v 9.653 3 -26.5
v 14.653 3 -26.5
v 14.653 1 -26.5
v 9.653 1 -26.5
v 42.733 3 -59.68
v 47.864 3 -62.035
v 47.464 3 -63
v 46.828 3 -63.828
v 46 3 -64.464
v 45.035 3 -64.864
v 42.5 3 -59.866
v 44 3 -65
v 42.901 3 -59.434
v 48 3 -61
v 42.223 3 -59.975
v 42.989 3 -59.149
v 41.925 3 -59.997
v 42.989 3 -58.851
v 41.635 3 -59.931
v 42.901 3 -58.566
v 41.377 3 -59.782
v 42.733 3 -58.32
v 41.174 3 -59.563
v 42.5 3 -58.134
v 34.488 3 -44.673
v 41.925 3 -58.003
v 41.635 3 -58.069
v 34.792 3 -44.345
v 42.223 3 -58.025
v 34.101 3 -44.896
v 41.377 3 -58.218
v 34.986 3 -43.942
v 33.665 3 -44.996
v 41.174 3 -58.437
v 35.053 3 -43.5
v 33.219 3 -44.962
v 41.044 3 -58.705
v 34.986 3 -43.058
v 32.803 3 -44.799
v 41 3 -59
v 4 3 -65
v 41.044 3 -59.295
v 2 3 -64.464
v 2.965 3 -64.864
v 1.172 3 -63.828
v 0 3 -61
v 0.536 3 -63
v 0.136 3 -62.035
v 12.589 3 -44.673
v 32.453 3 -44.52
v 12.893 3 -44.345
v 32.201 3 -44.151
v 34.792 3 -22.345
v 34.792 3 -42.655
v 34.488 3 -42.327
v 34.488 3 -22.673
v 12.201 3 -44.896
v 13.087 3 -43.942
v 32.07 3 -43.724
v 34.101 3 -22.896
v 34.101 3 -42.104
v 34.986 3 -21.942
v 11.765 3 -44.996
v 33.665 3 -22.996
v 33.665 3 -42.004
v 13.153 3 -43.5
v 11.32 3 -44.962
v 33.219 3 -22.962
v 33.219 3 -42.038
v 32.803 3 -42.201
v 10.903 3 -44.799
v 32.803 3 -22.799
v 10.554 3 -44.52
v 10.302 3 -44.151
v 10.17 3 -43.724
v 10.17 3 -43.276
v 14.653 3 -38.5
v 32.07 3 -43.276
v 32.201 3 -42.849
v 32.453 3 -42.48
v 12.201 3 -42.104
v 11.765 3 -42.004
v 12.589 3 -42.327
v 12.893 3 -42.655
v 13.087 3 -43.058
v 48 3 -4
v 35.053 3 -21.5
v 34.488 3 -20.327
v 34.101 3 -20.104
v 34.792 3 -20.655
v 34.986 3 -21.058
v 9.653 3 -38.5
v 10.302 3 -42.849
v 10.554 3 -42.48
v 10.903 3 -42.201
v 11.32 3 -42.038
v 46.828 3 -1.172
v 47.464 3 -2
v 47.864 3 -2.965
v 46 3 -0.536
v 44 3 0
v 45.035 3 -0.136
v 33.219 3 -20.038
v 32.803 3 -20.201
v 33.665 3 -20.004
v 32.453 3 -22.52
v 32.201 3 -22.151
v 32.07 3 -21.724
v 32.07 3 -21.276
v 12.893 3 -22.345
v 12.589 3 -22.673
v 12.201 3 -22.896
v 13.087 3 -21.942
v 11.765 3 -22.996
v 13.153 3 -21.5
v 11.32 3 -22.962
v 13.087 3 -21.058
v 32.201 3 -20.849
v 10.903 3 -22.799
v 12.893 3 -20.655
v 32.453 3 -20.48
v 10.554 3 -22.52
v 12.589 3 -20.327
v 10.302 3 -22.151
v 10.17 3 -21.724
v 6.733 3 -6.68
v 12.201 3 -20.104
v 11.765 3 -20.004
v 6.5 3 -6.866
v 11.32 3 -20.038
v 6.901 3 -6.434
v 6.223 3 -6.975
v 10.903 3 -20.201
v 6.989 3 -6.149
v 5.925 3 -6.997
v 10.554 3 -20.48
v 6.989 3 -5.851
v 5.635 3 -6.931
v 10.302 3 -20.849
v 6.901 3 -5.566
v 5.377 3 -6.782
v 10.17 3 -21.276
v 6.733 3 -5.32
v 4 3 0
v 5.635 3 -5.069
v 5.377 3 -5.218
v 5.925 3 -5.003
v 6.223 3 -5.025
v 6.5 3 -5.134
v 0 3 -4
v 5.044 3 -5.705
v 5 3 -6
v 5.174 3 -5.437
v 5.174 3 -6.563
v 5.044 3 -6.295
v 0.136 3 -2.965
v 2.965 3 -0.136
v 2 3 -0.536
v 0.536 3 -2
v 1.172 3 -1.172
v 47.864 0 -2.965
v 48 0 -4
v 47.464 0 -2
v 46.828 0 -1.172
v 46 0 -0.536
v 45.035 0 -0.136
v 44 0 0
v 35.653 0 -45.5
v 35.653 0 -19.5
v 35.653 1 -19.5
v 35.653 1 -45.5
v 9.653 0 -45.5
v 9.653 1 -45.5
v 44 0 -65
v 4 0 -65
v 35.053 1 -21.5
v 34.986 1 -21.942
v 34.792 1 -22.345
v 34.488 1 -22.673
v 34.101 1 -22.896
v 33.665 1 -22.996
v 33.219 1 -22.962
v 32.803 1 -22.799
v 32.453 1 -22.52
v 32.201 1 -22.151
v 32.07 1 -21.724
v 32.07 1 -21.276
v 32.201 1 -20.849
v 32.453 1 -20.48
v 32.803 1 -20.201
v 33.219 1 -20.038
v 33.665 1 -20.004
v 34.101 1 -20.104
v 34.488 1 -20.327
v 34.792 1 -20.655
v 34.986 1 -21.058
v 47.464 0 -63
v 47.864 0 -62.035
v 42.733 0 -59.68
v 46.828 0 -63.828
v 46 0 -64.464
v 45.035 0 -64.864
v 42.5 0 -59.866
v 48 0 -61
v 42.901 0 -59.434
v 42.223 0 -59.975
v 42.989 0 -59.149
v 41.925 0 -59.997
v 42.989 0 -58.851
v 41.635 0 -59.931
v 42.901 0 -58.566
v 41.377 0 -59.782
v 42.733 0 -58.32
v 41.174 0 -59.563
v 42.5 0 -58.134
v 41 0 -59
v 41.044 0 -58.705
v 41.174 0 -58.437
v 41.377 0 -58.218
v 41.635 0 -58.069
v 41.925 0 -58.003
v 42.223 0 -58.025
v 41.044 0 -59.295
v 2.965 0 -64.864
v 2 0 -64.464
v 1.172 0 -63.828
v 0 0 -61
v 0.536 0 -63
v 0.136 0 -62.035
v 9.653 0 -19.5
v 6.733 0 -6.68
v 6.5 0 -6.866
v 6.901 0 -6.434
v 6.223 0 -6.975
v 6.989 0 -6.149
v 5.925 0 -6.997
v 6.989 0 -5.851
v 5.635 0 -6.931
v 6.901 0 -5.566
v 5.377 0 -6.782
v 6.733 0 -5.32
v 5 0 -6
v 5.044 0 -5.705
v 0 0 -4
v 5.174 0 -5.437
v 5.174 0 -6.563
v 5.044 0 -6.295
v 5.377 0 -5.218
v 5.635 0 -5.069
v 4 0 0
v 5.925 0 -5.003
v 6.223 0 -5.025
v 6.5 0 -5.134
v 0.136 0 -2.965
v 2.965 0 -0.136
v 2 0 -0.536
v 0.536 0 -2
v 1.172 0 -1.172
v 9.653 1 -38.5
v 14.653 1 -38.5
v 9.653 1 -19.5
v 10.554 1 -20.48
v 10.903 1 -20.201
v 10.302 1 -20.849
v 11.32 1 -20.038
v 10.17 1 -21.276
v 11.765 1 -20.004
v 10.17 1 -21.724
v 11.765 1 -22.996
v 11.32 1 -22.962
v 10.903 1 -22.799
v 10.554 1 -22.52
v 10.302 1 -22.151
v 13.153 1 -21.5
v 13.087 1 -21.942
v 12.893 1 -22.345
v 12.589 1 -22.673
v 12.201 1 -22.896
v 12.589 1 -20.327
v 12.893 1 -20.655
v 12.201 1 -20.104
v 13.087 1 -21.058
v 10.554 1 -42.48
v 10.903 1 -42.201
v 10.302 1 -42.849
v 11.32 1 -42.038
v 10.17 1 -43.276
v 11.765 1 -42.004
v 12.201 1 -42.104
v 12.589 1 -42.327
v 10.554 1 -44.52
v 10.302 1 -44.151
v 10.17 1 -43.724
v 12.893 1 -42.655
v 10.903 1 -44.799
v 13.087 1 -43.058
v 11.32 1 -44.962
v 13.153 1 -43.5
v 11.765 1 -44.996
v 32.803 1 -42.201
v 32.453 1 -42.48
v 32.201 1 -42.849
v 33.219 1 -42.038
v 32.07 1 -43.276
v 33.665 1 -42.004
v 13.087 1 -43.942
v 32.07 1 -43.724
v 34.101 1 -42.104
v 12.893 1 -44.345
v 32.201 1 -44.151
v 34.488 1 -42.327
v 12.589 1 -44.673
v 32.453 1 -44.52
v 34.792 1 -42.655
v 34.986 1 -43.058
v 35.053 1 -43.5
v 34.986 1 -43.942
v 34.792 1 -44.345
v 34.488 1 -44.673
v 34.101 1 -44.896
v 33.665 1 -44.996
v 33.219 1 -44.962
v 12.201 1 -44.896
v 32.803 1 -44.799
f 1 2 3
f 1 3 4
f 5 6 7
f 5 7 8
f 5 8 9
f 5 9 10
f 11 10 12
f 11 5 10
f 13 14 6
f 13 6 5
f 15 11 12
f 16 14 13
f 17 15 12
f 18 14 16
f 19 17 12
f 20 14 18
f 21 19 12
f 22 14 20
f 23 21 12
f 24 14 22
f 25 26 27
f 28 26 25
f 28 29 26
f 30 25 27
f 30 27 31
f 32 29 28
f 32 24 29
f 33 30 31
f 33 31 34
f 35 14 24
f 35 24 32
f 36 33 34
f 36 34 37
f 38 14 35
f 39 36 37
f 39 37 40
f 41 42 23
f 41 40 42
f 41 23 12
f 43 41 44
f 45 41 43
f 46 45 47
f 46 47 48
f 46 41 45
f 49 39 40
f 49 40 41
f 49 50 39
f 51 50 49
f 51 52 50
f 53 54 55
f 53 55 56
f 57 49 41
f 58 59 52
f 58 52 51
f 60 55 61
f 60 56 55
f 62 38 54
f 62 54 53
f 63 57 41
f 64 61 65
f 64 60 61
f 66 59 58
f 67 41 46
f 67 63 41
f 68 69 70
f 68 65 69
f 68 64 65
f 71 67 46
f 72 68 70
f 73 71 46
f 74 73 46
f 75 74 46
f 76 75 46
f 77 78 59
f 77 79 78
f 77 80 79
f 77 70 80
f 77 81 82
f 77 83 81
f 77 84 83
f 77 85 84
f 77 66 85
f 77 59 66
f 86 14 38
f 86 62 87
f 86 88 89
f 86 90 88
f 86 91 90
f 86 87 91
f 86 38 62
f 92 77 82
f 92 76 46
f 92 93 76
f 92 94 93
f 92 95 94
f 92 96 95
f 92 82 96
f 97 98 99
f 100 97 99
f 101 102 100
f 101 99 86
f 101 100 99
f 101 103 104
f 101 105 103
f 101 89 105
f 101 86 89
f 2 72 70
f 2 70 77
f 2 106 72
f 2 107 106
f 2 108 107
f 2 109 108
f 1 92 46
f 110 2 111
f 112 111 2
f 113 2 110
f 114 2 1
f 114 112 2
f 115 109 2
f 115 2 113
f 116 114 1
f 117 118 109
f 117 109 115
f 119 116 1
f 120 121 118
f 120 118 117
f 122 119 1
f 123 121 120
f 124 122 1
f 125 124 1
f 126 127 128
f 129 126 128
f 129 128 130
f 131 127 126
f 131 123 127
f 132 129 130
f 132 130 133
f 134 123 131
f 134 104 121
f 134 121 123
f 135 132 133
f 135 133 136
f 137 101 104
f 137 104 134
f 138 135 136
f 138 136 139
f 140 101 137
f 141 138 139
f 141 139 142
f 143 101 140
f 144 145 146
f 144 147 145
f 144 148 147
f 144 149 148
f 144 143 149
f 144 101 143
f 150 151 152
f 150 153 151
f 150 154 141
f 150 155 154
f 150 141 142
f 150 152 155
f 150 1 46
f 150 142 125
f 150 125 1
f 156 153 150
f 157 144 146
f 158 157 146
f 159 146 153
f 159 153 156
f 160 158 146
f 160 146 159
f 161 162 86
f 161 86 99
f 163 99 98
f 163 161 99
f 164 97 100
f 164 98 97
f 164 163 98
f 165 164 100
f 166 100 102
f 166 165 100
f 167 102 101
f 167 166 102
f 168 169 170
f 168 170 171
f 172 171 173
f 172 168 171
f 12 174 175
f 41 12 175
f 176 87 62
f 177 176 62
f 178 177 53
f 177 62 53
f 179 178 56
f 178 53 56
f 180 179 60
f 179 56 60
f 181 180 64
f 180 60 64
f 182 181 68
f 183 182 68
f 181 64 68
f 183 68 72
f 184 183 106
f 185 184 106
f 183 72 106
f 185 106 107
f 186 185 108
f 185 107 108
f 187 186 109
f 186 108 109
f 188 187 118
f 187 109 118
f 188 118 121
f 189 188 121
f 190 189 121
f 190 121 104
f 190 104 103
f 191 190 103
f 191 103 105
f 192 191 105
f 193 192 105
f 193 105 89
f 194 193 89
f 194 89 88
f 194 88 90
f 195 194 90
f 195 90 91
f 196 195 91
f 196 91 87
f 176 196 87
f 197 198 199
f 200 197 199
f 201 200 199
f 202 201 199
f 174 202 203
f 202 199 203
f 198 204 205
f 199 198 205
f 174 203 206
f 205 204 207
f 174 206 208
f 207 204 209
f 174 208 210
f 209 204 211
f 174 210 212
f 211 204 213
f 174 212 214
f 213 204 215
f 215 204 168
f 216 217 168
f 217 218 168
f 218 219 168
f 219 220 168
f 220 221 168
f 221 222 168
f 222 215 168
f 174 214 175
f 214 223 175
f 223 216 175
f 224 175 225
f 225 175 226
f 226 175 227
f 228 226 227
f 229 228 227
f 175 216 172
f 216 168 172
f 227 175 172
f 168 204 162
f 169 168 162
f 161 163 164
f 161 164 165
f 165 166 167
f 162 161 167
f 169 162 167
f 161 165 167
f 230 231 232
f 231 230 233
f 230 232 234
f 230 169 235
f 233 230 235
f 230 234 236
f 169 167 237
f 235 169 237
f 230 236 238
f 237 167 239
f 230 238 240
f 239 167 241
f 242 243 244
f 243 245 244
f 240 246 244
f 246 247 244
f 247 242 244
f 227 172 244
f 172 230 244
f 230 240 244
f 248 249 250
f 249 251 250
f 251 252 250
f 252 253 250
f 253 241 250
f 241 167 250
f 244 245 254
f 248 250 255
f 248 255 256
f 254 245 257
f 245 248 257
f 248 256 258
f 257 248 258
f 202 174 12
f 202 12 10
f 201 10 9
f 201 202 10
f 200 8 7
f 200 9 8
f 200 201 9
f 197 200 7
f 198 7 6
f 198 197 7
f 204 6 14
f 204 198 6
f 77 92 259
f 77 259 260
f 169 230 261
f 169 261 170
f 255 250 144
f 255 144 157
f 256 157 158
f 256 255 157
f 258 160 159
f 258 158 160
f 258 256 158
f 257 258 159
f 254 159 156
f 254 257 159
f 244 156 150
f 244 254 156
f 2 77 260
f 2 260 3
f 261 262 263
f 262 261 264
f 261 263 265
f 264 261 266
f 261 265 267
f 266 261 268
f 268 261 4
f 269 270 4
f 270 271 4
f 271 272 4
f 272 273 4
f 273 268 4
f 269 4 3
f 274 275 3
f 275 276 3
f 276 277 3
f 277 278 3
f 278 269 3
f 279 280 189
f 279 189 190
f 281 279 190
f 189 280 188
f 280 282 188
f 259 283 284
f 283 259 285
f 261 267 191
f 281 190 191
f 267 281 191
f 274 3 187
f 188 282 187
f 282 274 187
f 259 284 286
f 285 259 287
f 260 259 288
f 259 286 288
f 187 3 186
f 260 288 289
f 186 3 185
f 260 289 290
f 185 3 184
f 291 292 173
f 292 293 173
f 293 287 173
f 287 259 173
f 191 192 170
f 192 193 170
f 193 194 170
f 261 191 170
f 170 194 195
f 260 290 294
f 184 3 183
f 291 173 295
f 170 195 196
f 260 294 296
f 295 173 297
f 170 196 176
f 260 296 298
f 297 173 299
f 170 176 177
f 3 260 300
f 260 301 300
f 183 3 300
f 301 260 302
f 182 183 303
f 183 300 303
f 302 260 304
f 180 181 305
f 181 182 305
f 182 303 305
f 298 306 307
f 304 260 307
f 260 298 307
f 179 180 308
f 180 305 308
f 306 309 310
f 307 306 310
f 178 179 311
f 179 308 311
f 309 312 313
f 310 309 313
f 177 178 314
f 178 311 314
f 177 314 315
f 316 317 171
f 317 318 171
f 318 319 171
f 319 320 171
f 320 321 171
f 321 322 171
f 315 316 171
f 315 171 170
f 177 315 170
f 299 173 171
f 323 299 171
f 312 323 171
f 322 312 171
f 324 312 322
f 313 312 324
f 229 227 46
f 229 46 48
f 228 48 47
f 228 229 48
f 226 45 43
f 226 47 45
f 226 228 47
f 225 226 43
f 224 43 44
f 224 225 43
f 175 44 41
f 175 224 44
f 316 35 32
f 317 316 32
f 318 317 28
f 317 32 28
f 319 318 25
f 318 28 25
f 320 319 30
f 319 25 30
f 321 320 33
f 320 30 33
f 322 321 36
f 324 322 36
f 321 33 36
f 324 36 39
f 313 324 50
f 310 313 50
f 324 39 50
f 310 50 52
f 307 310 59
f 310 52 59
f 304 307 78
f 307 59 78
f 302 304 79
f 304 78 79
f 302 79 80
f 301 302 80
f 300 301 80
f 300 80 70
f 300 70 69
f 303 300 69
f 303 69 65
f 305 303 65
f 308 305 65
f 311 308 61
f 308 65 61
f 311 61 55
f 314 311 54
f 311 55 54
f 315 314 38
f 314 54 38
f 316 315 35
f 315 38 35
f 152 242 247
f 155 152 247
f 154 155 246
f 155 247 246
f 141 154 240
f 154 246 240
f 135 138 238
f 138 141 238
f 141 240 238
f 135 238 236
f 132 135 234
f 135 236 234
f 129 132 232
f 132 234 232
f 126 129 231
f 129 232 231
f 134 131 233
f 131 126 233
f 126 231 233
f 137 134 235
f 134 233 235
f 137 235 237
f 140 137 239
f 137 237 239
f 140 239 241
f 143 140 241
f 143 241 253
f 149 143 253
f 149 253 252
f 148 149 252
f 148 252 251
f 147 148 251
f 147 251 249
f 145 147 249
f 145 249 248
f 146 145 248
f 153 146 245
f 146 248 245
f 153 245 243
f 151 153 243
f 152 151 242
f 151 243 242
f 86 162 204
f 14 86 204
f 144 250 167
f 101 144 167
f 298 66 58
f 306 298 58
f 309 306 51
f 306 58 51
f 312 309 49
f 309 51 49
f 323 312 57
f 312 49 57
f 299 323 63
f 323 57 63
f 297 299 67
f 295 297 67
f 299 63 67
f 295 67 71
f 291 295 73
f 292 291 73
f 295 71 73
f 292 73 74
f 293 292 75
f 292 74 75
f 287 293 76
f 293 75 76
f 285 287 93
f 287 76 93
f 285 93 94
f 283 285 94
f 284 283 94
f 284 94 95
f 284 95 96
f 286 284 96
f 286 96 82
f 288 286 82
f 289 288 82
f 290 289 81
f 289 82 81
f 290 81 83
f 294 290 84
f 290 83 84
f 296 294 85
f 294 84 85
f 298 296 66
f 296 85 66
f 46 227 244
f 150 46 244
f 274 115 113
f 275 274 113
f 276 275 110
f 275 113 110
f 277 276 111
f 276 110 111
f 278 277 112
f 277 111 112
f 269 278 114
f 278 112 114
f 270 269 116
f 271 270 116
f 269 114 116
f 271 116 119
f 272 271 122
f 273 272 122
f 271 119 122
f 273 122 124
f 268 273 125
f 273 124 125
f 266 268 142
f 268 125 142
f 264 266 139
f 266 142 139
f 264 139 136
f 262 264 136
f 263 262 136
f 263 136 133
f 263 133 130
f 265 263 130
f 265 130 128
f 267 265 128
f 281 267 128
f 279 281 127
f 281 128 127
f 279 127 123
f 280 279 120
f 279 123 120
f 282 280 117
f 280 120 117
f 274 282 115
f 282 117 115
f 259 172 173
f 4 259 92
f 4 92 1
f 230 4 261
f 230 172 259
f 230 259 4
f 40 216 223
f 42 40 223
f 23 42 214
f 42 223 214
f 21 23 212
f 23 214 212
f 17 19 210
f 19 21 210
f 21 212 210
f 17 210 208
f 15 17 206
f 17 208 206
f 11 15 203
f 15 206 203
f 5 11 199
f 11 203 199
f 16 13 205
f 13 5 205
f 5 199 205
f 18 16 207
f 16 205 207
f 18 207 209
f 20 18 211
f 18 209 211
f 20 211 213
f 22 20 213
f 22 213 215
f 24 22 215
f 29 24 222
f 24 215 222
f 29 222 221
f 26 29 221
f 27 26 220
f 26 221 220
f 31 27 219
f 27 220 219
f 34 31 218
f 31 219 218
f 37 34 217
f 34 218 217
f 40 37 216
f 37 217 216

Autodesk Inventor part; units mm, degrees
ref_plane "YZ Plane" through (0, 0, 0) normal (1, 0, 0) x (0, 1, 0)
ref_plane "XZ Plane" through (0, 0, 0) normal (0, 1, 0) x (-1, 0, 0)
ref_plane "XY Plane" through (0, 0, 0) normal (0, 0, 1) x (1, 0, 0)
sketch "Sketch1" plane through (0, 0, 0) normal (0, 1, 0) x (-1, 0, 0)
  line L0 (-4, 0) -> (-44, 0)
  line L1 (-48, -4) -> (-48, -61)
  line L2 (-44, -65) -> (-4, -65)
  line L3 (0, -61) -> (0, -4)
  arc A0 (0, -4) -> (-4, 0) centre (-4, -4) ccw
  arc A1 (-4, -65) -> (0, -61) centre (-4, -61) ccw
  arc A2 (-48, -61) -> (-44, -65) centre (-44, -61) ccw
  arc A3 (-44, 0) -> (-48, -4) centre (-44, -4) ccw
  line L4 (-48, -65) -> (-42, -65)
  line L5 (-48, -59) -> (-48, -65)
  line L6 (0, 0) -> (-6, 0)
  line L7 (0, -6) -> (0, 0)
  circle A4 centre (-6, -6) radius 1
  circle A5 centre (-42, -59) radius 1
  line L8 (-14.6534, -26.5) -> (-14.6534, -38.5)
  line L9 (-14.6534, -38.5) -> (-9.6534, -38.5)
  line L10 (-9.6534, -38.5) -> (-9.6534, -26.5)
  line L11 (-9.6534, -26.5) -> (-14.6534, -26.5)
  line L12 (-9.6534, -26.5) -> (-9.6534, -19.5)
  line L13 (-9.6534, -19.5) -> (-35.6534, -19.5)
  line L14 (-35.6534, -19.5) -> (-35.6534, -45.5)
  line L15 (-35.6534, -45.5) -> (-9.6534, -45.5)
  line L16 (-9.6534, -45.5) -> (-9.6534, -19.5)
  point P0 (-48, 0)
  point P1 (0, -65)
  dimension "d0" = 48
  dimension "d1" = 65
  dimension "d3" = 4
extrude "Extrusion1" add sketch "Sketch1" along normal blind 3 contours A0 L3 A1 L2 A2 L1 A3 L0
sketch "Sketch3" plane through (0, 3, 0) normal (0, 1, 0) x (1, 0, 0)
  line L0 (9.6534, 19.5) -> (9.6534, 45.5) projected
  line L1 (9.6534, 45.5) -> (9.6534, 38.5)
  line L2 (9.6534, 38.5) -> (14.6534, 38.5)
  line L3 (14.6534, 38.5) -> (14.6534, 26.5)
  line L4 (14.6534, 26.5) -> (9.6534, 26.5)
  line L5 (9.6534, 26.5) -> (9.6534, 38.5)
  line L6 (35.6534, 19.5) -> (9.6534, 19.5) projected
  line L7 (9.6534, 45.5) -> (35.6534, 45.5)
  line L8 (35.6534, 45.5) -> (35.6534, 19.5)
  line L9 (35.6534, 19.5) -> (9.6534, 19.5)
  line L10 (9.6534, 19.5) -> (9.6534, 45.5)
  line L11 (9.6534, 19.5) -> (11.6534, 19.5)
  line L12 (9.6534, 21.5) -> (9.6534, 19.5)
  circle A0 centre (11.6534, 21.5) radius 1.5
  line L13 (35.6534, 45.5) -> (35.6534, 19.5) projected
  line L14 (9.6534, 45.5) -> (35.6534, 45.5) projected
  circle A1 centre (11.6534, 43.5) radius 1.5
  circle A2 centre (33.5528, 21.5) radius 1.5
  circle A3 centre (33.5528, 43.5) radius 1.5
  point P0 (0, 0)
  dimension "d20" = 5
  dimension "d21" = 12
extrude "Extrusion2" add sketch "Sketch3" against normal blind 2 contours L0 L4 L3 L2 L7 L8 L6
properties part number "Tampa"
